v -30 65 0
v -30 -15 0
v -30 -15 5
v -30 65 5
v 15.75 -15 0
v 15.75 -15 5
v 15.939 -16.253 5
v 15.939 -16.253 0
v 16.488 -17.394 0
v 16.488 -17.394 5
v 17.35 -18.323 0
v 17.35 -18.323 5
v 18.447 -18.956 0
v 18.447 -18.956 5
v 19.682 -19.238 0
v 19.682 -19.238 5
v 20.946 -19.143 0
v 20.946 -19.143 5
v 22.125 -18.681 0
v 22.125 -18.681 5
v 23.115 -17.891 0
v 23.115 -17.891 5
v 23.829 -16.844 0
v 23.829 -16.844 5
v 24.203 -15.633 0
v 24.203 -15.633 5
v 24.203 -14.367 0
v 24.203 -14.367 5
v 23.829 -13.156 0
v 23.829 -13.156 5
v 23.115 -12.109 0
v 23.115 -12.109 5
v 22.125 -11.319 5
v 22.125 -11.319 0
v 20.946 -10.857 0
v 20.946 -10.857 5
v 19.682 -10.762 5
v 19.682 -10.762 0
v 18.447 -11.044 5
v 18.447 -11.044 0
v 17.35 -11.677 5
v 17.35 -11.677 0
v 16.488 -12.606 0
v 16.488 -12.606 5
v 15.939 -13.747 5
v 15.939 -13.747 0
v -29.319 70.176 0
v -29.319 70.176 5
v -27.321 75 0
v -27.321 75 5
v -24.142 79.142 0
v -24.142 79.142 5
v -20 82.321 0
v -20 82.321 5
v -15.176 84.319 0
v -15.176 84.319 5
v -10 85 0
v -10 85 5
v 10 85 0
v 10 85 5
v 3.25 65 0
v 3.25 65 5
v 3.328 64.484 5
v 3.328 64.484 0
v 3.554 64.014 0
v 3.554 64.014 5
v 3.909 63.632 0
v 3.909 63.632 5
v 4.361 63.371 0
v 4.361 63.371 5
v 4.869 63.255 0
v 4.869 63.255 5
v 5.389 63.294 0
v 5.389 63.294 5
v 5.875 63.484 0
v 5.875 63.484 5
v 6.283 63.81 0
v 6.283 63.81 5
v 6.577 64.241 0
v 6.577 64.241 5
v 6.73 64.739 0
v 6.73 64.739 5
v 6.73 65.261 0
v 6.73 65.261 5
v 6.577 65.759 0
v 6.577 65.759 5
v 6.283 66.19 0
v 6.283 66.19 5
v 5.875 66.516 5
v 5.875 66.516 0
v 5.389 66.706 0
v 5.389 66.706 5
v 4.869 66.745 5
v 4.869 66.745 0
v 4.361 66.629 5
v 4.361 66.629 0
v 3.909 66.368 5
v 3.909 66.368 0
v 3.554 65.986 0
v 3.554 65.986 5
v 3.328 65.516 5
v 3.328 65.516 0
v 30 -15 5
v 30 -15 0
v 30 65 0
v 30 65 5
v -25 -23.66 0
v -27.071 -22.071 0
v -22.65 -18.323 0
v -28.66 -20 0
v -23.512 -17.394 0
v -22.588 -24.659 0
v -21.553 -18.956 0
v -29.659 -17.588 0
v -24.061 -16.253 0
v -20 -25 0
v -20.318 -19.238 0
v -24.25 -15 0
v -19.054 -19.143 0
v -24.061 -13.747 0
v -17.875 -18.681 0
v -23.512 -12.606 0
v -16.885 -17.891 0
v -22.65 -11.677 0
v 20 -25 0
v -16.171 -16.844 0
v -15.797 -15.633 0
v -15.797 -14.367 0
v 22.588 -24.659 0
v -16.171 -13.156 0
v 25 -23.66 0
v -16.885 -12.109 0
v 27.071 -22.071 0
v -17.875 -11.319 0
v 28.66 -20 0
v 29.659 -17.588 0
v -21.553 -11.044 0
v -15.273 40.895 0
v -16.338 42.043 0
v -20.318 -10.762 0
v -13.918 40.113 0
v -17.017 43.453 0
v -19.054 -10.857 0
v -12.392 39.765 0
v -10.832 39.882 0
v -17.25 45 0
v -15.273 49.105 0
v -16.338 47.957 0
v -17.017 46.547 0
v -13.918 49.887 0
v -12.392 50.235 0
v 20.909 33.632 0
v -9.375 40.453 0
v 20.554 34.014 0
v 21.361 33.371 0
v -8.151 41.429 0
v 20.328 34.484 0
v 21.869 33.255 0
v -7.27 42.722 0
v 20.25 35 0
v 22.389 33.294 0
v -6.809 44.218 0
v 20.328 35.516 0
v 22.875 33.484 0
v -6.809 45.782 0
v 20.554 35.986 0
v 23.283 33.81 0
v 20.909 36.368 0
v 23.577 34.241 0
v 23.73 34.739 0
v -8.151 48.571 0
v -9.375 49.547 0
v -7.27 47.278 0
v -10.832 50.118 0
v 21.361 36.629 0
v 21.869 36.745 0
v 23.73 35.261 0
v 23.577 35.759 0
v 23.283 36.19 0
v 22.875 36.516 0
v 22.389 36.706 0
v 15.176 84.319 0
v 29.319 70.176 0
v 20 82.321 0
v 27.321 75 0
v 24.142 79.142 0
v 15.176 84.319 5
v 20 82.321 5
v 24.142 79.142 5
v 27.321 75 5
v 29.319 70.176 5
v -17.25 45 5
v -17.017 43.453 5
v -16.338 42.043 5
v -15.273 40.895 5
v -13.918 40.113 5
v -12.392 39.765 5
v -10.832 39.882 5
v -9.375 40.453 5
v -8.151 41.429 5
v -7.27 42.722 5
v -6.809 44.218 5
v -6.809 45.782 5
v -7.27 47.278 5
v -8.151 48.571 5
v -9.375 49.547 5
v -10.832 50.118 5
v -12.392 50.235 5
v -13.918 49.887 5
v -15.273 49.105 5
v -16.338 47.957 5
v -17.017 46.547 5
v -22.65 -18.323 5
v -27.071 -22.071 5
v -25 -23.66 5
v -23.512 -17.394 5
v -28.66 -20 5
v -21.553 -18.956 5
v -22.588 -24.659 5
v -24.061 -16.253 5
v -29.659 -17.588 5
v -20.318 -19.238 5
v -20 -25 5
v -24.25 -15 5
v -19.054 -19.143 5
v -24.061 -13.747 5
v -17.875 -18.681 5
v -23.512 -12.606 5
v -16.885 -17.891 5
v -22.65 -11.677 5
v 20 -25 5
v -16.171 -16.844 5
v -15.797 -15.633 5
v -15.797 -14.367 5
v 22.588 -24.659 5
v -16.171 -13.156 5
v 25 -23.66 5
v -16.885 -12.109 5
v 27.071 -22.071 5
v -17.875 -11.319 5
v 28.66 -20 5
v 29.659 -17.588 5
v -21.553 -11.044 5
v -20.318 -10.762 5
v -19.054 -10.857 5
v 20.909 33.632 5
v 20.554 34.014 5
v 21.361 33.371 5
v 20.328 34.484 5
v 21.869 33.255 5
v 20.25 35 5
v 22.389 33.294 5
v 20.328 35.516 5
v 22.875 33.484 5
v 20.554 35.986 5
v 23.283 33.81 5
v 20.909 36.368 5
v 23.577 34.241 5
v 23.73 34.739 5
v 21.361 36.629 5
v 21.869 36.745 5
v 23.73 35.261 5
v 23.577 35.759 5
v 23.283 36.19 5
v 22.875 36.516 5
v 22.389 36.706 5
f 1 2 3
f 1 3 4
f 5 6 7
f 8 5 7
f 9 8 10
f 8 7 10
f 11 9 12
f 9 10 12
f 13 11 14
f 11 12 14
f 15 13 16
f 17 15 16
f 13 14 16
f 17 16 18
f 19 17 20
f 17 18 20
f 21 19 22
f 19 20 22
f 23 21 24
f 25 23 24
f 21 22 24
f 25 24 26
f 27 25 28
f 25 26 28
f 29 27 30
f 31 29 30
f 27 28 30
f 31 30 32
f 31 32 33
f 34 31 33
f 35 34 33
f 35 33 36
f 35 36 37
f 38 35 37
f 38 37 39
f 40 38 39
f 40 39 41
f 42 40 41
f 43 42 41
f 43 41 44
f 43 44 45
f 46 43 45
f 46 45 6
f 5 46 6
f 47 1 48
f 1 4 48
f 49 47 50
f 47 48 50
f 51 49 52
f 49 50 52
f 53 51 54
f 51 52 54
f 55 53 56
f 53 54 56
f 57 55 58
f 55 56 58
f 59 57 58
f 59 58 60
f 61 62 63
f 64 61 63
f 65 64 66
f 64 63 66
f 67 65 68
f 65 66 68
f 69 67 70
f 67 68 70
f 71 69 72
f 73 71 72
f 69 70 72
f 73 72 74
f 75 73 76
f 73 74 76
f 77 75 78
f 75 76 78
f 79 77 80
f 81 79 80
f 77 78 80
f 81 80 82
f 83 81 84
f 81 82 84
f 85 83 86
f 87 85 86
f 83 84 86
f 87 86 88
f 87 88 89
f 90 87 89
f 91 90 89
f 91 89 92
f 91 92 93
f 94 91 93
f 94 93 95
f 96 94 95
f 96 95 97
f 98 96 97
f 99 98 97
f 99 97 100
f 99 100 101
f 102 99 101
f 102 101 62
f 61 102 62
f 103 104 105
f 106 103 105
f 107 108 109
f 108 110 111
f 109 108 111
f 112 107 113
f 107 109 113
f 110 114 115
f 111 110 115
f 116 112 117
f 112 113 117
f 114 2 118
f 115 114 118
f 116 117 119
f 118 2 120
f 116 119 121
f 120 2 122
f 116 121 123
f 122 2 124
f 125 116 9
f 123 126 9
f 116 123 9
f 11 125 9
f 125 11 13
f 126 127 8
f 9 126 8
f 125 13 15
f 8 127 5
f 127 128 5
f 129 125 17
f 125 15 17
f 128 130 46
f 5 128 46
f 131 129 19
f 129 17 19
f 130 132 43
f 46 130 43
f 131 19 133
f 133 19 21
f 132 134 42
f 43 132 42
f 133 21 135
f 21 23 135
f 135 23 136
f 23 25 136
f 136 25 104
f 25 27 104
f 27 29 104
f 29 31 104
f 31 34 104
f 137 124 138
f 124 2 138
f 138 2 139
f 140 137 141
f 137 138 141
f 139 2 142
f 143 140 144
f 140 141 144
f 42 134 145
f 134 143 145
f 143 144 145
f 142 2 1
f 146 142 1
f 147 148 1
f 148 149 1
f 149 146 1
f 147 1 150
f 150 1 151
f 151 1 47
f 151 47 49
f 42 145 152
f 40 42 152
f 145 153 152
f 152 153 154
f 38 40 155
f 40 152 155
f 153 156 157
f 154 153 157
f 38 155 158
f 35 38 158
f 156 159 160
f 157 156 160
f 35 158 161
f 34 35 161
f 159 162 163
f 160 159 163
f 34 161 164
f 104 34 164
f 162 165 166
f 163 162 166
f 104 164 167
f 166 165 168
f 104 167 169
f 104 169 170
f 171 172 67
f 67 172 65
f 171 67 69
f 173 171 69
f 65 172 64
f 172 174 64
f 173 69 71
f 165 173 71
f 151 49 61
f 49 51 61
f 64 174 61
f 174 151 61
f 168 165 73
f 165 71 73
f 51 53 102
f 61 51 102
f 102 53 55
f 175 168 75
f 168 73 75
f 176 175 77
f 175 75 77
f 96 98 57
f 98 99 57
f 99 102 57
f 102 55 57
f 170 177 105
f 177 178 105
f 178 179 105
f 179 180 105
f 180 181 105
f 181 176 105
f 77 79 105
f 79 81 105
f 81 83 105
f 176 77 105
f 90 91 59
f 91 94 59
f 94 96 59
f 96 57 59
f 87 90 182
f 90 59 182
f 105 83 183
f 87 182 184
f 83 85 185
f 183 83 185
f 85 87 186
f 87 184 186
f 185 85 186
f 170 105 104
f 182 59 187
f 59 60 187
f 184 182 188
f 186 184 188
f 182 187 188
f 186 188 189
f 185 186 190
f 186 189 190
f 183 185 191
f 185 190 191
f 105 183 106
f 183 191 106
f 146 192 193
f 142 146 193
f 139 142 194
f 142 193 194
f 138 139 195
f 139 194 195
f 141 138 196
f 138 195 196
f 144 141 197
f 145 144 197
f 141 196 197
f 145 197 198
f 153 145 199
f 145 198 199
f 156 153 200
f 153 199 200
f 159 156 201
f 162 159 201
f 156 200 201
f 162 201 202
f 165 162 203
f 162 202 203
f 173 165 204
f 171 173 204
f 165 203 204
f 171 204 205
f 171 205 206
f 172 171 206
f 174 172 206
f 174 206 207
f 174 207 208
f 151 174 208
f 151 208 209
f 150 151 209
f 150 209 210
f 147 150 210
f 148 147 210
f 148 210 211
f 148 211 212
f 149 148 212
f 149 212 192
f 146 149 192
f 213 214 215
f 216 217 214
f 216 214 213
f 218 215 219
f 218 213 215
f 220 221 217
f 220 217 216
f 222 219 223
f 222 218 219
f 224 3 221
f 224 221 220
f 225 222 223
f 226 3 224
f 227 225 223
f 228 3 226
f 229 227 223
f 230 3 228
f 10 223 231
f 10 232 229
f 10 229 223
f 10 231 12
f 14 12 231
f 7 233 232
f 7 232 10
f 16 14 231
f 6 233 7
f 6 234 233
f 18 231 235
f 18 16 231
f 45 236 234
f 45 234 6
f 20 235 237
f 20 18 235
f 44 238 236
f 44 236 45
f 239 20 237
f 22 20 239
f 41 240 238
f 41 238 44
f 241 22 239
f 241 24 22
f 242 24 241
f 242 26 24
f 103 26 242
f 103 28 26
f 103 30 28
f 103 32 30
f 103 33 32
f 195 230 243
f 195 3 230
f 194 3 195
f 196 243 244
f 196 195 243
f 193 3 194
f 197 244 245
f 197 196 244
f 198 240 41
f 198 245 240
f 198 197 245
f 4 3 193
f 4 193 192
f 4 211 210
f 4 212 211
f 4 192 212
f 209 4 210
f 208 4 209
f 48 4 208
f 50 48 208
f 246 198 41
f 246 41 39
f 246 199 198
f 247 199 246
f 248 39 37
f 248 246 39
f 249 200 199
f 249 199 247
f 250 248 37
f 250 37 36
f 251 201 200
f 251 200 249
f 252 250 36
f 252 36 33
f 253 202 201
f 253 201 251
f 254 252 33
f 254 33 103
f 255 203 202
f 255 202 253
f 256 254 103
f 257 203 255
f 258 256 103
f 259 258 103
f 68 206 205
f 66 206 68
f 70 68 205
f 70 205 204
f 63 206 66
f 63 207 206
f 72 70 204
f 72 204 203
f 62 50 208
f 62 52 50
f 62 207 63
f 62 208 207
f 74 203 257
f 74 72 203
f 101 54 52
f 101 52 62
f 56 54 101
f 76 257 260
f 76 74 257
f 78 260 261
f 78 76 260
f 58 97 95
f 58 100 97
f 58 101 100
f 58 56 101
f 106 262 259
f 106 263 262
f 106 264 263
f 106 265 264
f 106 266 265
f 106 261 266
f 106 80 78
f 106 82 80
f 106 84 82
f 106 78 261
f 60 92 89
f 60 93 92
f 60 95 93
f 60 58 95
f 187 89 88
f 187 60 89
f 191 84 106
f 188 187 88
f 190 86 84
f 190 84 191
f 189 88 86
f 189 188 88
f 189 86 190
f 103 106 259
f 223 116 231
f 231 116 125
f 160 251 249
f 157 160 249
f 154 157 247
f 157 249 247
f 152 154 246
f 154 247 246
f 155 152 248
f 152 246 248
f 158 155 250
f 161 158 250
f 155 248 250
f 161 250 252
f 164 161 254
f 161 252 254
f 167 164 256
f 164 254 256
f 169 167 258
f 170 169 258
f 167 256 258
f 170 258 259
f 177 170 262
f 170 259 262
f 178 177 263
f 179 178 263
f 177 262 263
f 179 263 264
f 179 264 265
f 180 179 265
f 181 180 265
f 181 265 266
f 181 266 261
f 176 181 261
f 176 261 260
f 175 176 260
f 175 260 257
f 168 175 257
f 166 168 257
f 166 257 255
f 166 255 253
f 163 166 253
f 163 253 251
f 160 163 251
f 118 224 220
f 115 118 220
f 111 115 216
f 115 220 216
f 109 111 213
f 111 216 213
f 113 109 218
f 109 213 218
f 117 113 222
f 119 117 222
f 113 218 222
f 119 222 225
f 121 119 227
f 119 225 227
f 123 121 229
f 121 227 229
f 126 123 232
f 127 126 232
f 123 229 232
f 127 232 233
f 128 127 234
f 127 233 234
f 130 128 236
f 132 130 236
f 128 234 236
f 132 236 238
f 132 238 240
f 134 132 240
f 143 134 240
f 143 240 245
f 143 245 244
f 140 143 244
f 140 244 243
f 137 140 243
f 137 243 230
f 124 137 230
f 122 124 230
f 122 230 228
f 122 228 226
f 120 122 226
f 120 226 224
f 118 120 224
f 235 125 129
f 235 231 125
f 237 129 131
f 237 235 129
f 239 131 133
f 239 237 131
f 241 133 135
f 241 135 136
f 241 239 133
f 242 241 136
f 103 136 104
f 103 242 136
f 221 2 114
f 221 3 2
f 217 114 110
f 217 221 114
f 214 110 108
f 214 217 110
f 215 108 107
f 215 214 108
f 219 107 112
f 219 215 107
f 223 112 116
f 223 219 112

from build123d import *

# Parameters (mm, degrees)
F0_W     = 60
F0_H     = 110
F1_DEPTH = 5
F2_D     = 8.5
F3_D     = 10.5
F4_D     = 3.5
F5_R     = 10
F6_R     = 20


with BuildPart() as f1:
    # F0 (on Top) → F1 (new body)
    with BuildSketch(Plane.XY):
        with Locations((0, 30)):
            Rectangle(F0_W, F0_H)
    extrude(amount=F1_DEPTH)

    # F2 (through all)
    with Locations(Plane(origin=(0, 0, 0), x_dir=(1, 0, 0), z_dir=(0, 0, -1))):
        with Locations((-20, 15), (20, 15)):
            Hole(F2_D / 2)

    # F3 (through all)
    with Locations(Plane(origin=(0, 0, 0), x_dir=(1, 0, 0), z_dir=(0, 0, -1))):
        with Locations((-12, -45)):
            Hole(F3_D / 2)

    # F4 (through all)
    with Locations(Plane(origin=(0, 0, 0), x_dir=(1, 0, 0), z_dir=(0, 0, -1))):
        with Locations((5, -65), (22, -35)):
            Hole(F4_D / 2)

    # F5
    f5_edges = [f1.edges().sort_by_distance(p)[0] for p in [
        (-30, -25, 2.5),
        (30, -25, 2.5),
    ]]
    fillet(f5_edges, radius=F5_R)

    # F6
    f6_edges = [f1.edges().sort_by_distance(p)[0] for p in [
        (-30, 85, 2.5),
        (30, 85, 2.5),
    ]]
    fillet(f6_edges, radius=F6_R)


solid = f1.part
